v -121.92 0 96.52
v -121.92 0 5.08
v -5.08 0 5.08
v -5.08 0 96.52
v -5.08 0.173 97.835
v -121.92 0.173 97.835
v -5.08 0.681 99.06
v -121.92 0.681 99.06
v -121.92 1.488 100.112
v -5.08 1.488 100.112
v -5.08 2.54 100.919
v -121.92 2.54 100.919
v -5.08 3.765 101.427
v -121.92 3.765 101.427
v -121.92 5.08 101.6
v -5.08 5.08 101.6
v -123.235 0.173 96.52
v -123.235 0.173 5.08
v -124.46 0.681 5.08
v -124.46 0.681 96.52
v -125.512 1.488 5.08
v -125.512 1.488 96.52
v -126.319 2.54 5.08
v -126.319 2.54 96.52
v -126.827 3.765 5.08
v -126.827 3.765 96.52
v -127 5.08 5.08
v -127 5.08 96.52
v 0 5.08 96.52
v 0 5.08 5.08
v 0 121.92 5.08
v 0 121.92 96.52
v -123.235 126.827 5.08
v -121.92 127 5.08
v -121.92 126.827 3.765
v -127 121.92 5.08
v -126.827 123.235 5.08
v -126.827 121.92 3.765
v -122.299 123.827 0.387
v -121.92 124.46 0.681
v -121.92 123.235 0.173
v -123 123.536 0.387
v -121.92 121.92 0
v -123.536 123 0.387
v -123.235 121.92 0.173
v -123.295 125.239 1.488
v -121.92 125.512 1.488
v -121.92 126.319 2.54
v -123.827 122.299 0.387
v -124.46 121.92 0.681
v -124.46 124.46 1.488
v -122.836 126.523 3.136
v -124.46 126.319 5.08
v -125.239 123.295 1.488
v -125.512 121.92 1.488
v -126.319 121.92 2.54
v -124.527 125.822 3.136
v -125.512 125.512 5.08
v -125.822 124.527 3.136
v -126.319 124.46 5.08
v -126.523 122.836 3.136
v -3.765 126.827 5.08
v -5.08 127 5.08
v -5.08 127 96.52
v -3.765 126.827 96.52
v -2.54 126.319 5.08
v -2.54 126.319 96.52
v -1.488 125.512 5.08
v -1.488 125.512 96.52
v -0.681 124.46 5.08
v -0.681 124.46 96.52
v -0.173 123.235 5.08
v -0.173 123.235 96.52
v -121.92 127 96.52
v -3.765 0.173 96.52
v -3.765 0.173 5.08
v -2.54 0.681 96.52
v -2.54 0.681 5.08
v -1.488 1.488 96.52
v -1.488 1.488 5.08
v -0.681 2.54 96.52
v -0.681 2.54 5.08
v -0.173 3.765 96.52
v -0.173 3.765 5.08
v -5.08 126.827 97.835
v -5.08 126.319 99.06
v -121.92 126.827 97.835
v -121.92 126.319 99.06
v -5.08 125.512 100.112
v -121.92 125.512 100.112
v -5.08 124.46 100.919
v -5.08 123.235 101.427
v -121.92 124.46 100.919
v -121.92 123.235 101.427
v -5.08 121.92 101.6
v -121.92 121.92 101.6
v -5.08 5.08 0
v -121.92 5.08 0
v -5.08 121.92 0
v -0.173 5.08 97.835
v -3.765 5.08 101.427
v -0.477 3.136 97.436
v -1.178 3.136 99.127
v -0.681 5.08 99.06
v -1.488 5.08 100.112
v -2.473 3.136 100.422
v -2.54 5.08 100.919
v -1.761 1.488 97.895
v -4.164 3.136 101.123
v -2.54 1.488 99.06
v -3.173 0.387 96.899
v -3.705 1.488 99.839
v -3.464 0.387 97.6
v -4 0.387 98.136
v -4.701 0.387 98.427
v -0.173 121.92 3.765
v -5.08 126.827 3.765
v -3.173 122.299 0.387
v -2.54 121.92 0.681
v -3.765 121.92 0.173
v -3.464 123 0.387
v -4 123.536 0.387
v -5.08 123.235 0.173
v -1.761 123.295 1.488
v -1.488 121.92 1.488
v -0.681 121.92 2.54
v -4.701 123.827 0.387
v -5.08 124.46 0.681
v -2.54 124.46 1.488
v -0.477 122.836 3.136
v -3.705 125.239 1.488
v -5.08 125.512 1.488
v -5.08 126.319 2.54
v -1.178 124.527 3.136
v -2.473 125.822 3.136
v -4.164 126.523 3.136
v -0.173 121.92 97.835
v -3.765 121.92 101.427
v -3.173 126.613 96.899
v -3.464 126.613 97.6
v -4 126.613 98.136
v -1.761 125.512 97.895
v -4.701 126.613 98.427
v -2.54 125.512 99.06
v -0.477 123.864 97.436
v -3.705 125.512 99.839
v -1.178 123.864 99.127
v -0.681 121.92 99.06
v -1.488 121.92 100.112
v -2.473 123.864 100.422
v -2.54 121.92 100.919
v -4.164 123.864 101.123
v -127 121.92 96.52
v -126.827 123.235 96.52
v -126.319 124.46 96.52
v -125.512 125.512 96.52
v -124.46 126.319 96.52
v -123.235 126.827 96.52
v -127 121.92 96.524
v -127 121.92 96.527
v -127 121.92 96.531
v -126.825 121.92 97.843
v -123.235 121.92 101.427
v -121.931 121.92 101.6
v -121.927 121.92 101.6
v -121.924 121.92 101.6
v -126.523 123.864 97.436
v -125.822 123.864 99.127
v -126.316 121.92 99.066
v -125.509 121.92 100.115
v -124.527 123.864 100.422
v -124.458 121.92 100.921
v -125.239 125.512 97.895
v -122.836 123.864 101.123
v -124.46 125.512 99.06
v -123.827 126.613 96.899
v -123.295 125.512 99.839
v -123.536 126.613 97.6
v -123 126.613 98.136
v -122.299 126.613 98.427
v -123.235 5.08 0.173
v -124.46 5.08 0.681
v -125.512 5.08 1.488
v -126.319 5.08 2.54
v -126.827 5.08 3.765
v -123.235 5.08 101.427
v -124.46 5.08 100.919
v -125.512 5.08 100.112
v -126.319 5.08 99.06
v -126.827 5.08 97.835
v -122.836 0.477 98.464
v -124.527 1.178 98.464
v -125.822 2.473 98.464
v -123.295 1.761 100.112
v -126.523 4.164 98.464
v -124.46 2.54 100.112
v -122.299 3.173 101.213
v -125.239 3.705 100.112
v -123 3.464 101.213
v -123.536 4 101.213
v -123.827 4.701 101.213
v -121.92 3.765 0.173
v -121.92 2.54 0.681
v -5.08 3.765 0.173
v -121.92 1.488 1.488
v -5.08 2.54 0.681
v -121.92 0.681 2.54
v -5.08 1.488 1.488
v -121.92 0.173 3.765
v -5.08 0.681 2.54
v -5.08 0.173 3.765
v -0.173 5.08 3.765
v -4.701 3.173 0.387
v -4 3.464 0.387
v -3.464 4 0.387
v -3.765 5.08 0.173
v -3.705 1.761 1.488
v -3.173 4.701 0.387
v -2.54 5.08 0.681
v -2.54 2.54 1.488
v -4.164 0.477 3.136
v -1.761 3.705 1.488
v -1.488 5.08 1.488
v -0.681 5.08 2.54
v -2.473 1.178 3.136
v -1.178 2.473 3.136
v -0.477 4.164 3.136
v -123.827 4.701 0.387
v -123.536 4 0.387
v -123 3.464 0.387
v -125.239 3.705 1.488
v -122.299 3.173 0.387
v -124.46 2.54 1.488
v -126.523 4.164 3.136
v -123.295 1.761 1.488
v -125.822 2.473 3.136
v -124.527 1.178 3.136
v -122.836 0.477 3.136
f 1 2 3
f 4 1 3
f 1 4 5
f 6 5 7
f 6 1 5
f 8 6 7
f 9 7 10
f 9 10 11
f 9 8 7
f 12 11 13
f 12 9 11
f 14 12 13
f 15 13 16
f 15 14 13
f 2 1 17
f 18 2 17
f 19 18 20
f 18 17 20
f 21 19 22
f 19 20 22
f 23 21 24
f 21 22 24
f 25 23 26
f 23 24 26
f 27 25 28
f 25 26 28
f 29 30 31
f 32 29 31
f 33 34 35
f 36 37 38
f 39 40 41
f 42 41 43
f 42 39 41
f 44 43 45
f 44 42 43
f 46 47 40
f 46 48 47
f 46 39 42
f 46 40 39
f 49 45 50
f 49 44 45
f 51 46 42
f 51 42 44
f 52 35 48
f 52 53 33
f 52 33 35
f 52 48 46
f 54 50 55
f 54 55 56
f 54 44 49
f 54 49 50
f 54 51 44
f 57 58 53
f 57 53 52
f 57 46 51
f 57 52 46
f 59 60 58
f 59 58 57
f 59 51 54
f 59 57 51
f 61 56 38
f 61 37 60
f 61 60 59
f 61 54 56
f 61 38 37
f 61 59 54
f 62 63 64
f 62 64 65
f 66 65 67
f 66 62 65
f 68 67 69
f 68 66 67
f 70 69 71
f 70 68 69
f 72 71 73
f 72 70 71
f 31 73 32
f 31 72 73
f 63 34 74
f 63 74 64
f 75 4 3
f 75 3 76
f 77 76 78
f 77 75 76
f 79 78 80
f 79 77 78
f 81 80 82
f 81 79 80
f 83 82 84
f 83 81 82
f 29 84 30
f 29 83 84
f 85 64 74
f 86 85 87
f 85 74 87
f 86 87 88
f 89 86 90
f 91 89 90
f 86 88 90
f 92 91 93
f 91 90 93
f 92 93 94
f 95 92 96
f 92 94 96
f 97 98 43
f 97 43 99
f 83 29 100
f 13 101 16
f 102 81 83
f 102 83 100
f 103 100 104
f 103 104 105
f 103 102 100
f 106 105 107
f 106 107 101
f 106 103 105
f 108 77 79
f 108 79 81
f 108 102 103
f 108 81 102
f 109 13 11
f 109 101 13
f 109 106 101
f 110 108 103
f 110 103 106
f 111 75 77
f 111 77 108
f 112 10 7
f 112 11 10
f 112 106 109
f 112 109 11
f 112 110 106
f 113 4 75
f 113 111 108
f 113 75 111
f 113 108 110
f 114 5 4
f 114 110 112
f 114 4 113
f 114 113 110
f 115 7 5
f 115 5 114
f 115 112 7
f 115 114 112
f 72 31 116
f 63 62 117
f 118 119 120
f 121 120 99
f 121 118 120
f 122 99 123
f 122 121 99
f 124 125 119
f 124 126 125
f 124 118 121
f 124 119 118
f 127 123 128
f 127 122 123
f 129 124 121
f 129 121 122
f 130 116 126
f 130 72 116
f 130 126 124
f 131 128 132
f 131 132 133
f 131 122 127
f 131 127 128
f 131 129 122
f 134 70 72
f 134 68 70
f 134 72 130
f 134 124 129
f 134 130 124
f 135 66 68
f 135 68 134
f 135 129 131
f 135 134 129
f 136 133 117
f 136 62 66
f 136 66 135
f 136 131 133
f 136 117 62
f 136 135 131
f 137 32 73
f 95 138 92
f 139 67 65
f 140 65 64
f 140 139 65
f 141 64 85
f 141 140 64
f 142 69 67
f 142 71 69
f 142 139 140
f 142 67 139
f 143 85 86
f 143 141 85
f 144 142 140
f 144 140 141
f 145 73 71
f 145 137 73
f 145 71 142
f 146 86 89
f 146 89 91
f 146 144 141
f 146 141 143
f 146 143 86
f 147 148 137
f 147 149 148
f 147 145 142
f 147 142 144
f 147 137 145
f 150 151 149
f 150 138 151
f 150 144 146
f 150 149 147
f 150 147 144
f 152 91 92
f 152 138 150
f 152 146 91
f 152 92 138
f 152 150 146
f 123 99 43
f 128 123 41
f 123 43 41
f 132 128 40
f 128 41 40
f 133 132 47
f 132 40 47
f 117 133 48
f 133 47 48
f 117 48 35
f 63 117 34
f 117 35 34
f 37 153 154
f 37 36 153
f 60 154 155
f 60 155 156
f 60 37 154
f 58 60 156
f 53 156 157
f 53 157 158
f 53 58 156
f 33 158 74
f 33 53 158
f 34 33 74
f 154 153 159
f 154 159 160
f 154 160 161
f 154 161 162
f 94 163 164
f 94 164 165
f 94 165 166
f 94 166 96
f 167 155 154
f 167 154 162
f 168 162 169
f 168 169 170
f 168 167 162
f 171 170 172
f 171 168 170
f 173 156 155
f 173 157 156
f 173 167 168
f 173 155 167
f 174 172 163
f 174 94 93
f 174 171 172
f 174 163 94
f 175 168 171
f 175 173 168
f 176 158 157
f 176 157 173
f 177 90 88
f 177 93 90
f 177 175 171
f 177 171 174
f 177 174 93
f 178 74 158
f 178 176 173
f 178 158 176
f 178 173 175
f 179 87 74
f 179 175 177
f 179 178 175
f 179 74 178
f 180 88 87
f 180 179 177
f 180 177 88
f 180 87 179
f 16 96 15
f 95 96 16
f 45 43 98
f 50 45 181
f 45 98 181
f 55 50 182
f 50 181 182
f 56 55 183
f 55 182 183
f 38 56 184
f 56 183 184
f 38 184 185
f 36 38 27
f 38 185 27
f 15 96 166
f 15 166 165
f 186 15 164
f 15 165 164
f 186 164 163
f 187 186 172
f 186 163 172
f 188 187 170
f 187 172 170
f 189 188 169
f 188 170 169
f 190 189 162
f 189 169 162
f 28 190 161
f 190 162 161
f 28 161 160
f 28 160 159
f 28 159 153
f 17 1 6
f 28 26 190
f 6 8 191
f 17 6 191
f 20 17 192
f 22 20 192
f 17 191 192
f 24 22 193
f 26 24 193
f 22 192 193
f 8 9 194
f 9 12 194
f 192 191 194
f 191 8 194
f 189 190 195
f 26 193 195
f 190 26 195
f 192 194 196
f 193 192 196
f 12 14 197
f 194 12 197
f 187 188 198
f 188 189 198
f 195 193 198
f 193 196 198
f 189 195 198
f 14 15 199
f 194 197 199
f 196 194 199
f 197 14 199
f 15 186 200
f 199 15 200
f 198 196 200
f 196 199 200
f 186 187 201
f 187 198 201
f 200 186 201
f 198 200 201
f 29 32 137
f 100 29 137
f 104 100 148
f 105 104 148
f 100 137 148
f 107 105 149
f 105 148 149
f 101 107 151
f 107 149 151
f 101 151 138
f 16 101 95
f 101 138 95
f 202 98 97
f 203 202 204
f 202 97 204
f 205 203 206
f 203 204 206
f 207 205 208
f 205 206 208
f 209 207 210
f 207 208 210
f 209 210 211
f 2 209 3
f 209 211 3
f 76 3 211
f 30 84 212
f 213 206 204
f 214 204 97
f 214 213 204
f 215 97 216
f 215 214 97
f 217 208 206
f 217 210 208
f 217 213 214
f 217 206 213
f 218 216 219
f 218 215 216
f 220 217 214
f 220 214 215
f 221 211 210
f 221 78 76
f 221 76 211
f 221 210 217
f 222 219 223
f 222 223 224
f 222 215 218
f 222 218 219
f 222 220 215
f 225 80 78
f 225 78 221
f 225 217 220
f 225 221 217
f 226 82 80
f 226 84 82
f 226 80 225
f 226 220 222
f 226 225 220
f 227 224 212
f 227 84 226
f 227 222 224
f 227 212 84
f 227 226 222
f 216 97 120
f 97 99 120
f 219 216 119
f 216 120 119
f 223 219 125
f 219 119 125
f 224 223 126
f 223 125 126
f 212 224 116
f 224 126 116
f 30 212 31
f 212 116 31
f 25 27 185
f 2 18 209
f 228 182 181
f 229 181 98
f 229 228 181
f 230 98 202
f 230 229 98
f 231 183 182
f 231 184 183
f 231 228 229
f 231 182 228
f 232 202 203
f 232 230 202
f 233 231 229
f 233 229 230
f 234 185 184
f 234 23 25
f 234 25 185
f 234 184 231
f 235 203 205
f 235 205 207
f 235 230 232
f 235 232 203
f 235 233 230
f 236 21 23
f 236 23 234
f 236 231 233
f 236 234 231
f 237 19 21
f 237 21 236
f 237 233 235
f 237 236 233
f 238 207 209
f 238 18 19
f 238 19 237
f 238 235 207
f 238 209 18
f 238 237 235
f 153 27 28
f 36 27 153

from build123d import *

# Parameters (mm, degrees)
F0_W         = 127
F0_H         = 127
F1_DEPTH     = 101.6
F2_R         = 5.08
F3_R         = 5.08
F4_T1_DEPTH  = 134.62
F4_T3_DEPTH  = 127
F4_T5_DEPTH  = 116.84
F4_S9_W      = 5.08
F4_S9_H      = 5.08
F4_T10_DEPTH = 5.08
F4_T14_ANGLE = 90
F5_T1_DEPTH  = 116.84
F5_T3_DEPTH  = 109.22
F5_S7_W      = 5.08
F5_S7_H      = 5.08
F5_T8_DEPTH  = 5.08
F5_T12_ANGLE = 90
F6_R         = 5.08


# Not quite as in the source:
# - a fillet or chamfer that OpenCascade refuses, or shapes differently, is made with other operations: its cross-section is extruded or revolved along the edge and cut away or added


with BuildPart() as f1:
    # F0 (on Top) → F1 (new body)
    with BuildSketch(Plane.XY):
        with Locations((-63.5, 63.5)):
            Rectangle(F0_W, F0_H)
    extrude(amount=F1_DEPTH)

    # F2
    f2_edges = [f1.edges().sort_by_distance(p)[0] for p in [
        (0, 63.5, 101.6),
        (0, 0, 50.8),
    ]]
    fillet(f2_edges, radius=F2_R)

    # F3
    f3_edges = [f1.edges().sort_by_distance(p)[0] for p in [
        (-127, 0, 50.8),
    ]]
    fillet(f3_edges, radius=F3_R)

    # F4: fillet of radius 5.08 on 2 edges, made by hand

    # F4_s2 → F4_t1 (cut)
    with BuildSketch(Plane.XZ.offset(-139.7)):
        with BuildLine():
            ThreePointArc((-121.92, 101.6), (-125.5121024484, 100.1121024484), (-127, 96.52))
            Line((-127, 96.52), (-127, 101.6))
            Line((-127, 101.6), (-121.92, 101.6))
        make_face()
    extrude(amount=F4_T1_DEPTH, mode=Mode.SUBTRACT)

    # F4_s4 → F4_t3 (cut)
    with BuildSketch(Plane.XY.offset(-12.7)):
        with BuildLine():
            ThreePointArc((-127, 121.92), (-125.5121024484, 125.5121024484), (-121.92, 127))
            Line((-121.92, 127), (-127, 127))
            Line((-127, 127), (-127, 121.92))
        make_face()
    extrude(amount=F4_T3_DEPTH, mode=Mode.SUBTRACT)

    # F4_s6 → F4_t5 (cut)
    with BuildSketch(Plane.YZ.offset(-121.92)):
        with BuildLine():
            ThreePointArc((0, 96.52), (1.4878975516, 100.1121024484), (5.08, 101.6))
            Line((5.08, 101.6), (0, 101.6))
            Line((0, 101.6), (0, 96.52))
        make_face()
    extrude(amount=F4_T5_DEPTH, mode=Mode.SUBTRACT)


with BuildPart() as f4_tool8:
    # F4_s9 → F4_t10 (new body)
    with BuildSketch(Plane.XZ.offset(-5.08)):
        with Locations((-2.54, 99.06)):
            Rectangle(F4_S9_W, F4_S9_H)
    extrude(amount=F4_T10_DEPTH)

    # F4_s11 → F4_t12 (revolve, cut)
    with BuildSketch(Plane(origin=(-5.08, 5.08, 96.52), x_dir=(-0.7071067812, 0, -0.7071067812), z_dir=(-0.7071067812, 0, 0.7071067812))):
        with BuildLine():
            ThreePointArc((0, -5.08), (5.08, 0), (0, 5.08))
            Line((0, 5.08), (0, -5.08))
        make_face()
    revolve(axis=Axis((-5.08, 5.08, 96.52), (0, -1, 0)), mode=Mode.SUBTRACT)


with BuildPart() as f1_1:
    add(f1.part)

    # F4_t7: cut F4_tool8
    add(f4_tool8.part, mode=Mode.SUBTRACT)

    # F4_s13 → F4_t14 (revolve, cut)
    with BuildSketch(Plane.YZ.offset(-121.92)):
        with BuildLine():
            ThreePointArc((0, 96.52), (1.4878975516, 100.1121024484), (5.08, 101.6))
            Line((5.08, 101.6), (0, 101.6))
            Line((0, 101.6), (0, 96.52))
        make_face()
    revolve(axis=Axis((-121.92, 5.08, 101.6), (0, 0, -1)), revolution_arc=F4_T14_ANGLE, mode=Mode.SUBTRACT)

    # F5: fillet of radius 5.08 on 2 edges, made by hand

    # F5_s2 → F5_t1 (cut)
    with BuildSketch(Plane.YZ.offset(-121.92)):
        with BuildLine():
            ThreePointArc((127, 96.52), (125.5121024484, 100.1121024484), (121.92, 101.6))
            Line((121.92, 101.6), (127, 101.6))
            Line((127, 101.6), (127, 96.52))
        make_face()
    extrude(amount=F5_T1_DEPTH, mode=Mode.SUBTRACT)

    # F5_s4 → F5_t3 (cut)
    with BuildSketch(Plane.XY.offset(-12.7)):
        with BuildLine():
            ThreePointArc((-5.08, 127), (-1.4878975516, 125.5121024484), (0, 121.92))
            Line((0, 121.92), (0, 127))
            Line((0, 127), (-5.08, 127))
        make_face()
    extrude(amount=F5_T3_DEPTH, mode=Mode.SUBTRACT)


with BuildPart() as f5_tool6:
    # F5_s7 → F5_t8 (new body)
    with BuildSketch(Plane.XZ.offset(-121.92)):
        with Locations((-124.46, 99.06)):
            Rectangle(F5_S7_W, F5_S7_H)
    extrude(amount=-F5_T8_DEPTH)

    # F5_s9 → F5_t10 (revolve, cut)
    with BuildSketch(Plane(origin=(-121.92, 121.92, 96.52), x_dir=(0.7071067812, 0, -0.7071067812), z_dir=(0.7071067812, 0, 0.7071067812))):
        with BuildLine():
            ThreePointArc((0, -5.08), (5.08, 0), (0, 5.08))
            Line((0, 5.08), (0, -5.08))
        make_face()
    revolve(axis=Axis((-121.92, 121.92, 96.52), (0, 1, 0)), mode=Mode.SUBTRACT)


with BuildPart() as f1_2:
    add(f1_1.part)

    # F5_t5: cut F5_tool6
    add(f5_tool6.part, mode=Mode.SUBTRACT)

    # F5_s11 → F5_t12 (revolve, cut)
    with BuildSketch(Plane.XY.offset(96.52)):
        with BuildLine():
            ThreePointArc((-5.08, 127), (-1.4878975516, 125.5121024484), (0, 121.92))
            Line((0, 121.92), (0, 127))
            Line((0, 127), (-5.08, 127))
        make_face()
    revolve(axis=Axis((-5.08, 127, 96.52), (0, -1, 0)), revolution_arc=F5_T12_ANGLE, mode=Mode.SUBTRACT)

    # F6
    f6_edges = [f1_2.edges().sort_by_distance(p)[0] for p in [
        (0, 63.5, 0),
        (-125.512102, 1.487898, 0),
        (-127, 63.5, 0),
        (-125.512102, 125.512102, 0),
        (-63.5, 127, 0),
        (-1.487898, 125.512102, 0),
        (-1.487898, 1.487898, 0),
        (-63.5, 0, 0),
    ]]
    fillet(f6_edges, radius=F6_R)


solid = f1_2.part
